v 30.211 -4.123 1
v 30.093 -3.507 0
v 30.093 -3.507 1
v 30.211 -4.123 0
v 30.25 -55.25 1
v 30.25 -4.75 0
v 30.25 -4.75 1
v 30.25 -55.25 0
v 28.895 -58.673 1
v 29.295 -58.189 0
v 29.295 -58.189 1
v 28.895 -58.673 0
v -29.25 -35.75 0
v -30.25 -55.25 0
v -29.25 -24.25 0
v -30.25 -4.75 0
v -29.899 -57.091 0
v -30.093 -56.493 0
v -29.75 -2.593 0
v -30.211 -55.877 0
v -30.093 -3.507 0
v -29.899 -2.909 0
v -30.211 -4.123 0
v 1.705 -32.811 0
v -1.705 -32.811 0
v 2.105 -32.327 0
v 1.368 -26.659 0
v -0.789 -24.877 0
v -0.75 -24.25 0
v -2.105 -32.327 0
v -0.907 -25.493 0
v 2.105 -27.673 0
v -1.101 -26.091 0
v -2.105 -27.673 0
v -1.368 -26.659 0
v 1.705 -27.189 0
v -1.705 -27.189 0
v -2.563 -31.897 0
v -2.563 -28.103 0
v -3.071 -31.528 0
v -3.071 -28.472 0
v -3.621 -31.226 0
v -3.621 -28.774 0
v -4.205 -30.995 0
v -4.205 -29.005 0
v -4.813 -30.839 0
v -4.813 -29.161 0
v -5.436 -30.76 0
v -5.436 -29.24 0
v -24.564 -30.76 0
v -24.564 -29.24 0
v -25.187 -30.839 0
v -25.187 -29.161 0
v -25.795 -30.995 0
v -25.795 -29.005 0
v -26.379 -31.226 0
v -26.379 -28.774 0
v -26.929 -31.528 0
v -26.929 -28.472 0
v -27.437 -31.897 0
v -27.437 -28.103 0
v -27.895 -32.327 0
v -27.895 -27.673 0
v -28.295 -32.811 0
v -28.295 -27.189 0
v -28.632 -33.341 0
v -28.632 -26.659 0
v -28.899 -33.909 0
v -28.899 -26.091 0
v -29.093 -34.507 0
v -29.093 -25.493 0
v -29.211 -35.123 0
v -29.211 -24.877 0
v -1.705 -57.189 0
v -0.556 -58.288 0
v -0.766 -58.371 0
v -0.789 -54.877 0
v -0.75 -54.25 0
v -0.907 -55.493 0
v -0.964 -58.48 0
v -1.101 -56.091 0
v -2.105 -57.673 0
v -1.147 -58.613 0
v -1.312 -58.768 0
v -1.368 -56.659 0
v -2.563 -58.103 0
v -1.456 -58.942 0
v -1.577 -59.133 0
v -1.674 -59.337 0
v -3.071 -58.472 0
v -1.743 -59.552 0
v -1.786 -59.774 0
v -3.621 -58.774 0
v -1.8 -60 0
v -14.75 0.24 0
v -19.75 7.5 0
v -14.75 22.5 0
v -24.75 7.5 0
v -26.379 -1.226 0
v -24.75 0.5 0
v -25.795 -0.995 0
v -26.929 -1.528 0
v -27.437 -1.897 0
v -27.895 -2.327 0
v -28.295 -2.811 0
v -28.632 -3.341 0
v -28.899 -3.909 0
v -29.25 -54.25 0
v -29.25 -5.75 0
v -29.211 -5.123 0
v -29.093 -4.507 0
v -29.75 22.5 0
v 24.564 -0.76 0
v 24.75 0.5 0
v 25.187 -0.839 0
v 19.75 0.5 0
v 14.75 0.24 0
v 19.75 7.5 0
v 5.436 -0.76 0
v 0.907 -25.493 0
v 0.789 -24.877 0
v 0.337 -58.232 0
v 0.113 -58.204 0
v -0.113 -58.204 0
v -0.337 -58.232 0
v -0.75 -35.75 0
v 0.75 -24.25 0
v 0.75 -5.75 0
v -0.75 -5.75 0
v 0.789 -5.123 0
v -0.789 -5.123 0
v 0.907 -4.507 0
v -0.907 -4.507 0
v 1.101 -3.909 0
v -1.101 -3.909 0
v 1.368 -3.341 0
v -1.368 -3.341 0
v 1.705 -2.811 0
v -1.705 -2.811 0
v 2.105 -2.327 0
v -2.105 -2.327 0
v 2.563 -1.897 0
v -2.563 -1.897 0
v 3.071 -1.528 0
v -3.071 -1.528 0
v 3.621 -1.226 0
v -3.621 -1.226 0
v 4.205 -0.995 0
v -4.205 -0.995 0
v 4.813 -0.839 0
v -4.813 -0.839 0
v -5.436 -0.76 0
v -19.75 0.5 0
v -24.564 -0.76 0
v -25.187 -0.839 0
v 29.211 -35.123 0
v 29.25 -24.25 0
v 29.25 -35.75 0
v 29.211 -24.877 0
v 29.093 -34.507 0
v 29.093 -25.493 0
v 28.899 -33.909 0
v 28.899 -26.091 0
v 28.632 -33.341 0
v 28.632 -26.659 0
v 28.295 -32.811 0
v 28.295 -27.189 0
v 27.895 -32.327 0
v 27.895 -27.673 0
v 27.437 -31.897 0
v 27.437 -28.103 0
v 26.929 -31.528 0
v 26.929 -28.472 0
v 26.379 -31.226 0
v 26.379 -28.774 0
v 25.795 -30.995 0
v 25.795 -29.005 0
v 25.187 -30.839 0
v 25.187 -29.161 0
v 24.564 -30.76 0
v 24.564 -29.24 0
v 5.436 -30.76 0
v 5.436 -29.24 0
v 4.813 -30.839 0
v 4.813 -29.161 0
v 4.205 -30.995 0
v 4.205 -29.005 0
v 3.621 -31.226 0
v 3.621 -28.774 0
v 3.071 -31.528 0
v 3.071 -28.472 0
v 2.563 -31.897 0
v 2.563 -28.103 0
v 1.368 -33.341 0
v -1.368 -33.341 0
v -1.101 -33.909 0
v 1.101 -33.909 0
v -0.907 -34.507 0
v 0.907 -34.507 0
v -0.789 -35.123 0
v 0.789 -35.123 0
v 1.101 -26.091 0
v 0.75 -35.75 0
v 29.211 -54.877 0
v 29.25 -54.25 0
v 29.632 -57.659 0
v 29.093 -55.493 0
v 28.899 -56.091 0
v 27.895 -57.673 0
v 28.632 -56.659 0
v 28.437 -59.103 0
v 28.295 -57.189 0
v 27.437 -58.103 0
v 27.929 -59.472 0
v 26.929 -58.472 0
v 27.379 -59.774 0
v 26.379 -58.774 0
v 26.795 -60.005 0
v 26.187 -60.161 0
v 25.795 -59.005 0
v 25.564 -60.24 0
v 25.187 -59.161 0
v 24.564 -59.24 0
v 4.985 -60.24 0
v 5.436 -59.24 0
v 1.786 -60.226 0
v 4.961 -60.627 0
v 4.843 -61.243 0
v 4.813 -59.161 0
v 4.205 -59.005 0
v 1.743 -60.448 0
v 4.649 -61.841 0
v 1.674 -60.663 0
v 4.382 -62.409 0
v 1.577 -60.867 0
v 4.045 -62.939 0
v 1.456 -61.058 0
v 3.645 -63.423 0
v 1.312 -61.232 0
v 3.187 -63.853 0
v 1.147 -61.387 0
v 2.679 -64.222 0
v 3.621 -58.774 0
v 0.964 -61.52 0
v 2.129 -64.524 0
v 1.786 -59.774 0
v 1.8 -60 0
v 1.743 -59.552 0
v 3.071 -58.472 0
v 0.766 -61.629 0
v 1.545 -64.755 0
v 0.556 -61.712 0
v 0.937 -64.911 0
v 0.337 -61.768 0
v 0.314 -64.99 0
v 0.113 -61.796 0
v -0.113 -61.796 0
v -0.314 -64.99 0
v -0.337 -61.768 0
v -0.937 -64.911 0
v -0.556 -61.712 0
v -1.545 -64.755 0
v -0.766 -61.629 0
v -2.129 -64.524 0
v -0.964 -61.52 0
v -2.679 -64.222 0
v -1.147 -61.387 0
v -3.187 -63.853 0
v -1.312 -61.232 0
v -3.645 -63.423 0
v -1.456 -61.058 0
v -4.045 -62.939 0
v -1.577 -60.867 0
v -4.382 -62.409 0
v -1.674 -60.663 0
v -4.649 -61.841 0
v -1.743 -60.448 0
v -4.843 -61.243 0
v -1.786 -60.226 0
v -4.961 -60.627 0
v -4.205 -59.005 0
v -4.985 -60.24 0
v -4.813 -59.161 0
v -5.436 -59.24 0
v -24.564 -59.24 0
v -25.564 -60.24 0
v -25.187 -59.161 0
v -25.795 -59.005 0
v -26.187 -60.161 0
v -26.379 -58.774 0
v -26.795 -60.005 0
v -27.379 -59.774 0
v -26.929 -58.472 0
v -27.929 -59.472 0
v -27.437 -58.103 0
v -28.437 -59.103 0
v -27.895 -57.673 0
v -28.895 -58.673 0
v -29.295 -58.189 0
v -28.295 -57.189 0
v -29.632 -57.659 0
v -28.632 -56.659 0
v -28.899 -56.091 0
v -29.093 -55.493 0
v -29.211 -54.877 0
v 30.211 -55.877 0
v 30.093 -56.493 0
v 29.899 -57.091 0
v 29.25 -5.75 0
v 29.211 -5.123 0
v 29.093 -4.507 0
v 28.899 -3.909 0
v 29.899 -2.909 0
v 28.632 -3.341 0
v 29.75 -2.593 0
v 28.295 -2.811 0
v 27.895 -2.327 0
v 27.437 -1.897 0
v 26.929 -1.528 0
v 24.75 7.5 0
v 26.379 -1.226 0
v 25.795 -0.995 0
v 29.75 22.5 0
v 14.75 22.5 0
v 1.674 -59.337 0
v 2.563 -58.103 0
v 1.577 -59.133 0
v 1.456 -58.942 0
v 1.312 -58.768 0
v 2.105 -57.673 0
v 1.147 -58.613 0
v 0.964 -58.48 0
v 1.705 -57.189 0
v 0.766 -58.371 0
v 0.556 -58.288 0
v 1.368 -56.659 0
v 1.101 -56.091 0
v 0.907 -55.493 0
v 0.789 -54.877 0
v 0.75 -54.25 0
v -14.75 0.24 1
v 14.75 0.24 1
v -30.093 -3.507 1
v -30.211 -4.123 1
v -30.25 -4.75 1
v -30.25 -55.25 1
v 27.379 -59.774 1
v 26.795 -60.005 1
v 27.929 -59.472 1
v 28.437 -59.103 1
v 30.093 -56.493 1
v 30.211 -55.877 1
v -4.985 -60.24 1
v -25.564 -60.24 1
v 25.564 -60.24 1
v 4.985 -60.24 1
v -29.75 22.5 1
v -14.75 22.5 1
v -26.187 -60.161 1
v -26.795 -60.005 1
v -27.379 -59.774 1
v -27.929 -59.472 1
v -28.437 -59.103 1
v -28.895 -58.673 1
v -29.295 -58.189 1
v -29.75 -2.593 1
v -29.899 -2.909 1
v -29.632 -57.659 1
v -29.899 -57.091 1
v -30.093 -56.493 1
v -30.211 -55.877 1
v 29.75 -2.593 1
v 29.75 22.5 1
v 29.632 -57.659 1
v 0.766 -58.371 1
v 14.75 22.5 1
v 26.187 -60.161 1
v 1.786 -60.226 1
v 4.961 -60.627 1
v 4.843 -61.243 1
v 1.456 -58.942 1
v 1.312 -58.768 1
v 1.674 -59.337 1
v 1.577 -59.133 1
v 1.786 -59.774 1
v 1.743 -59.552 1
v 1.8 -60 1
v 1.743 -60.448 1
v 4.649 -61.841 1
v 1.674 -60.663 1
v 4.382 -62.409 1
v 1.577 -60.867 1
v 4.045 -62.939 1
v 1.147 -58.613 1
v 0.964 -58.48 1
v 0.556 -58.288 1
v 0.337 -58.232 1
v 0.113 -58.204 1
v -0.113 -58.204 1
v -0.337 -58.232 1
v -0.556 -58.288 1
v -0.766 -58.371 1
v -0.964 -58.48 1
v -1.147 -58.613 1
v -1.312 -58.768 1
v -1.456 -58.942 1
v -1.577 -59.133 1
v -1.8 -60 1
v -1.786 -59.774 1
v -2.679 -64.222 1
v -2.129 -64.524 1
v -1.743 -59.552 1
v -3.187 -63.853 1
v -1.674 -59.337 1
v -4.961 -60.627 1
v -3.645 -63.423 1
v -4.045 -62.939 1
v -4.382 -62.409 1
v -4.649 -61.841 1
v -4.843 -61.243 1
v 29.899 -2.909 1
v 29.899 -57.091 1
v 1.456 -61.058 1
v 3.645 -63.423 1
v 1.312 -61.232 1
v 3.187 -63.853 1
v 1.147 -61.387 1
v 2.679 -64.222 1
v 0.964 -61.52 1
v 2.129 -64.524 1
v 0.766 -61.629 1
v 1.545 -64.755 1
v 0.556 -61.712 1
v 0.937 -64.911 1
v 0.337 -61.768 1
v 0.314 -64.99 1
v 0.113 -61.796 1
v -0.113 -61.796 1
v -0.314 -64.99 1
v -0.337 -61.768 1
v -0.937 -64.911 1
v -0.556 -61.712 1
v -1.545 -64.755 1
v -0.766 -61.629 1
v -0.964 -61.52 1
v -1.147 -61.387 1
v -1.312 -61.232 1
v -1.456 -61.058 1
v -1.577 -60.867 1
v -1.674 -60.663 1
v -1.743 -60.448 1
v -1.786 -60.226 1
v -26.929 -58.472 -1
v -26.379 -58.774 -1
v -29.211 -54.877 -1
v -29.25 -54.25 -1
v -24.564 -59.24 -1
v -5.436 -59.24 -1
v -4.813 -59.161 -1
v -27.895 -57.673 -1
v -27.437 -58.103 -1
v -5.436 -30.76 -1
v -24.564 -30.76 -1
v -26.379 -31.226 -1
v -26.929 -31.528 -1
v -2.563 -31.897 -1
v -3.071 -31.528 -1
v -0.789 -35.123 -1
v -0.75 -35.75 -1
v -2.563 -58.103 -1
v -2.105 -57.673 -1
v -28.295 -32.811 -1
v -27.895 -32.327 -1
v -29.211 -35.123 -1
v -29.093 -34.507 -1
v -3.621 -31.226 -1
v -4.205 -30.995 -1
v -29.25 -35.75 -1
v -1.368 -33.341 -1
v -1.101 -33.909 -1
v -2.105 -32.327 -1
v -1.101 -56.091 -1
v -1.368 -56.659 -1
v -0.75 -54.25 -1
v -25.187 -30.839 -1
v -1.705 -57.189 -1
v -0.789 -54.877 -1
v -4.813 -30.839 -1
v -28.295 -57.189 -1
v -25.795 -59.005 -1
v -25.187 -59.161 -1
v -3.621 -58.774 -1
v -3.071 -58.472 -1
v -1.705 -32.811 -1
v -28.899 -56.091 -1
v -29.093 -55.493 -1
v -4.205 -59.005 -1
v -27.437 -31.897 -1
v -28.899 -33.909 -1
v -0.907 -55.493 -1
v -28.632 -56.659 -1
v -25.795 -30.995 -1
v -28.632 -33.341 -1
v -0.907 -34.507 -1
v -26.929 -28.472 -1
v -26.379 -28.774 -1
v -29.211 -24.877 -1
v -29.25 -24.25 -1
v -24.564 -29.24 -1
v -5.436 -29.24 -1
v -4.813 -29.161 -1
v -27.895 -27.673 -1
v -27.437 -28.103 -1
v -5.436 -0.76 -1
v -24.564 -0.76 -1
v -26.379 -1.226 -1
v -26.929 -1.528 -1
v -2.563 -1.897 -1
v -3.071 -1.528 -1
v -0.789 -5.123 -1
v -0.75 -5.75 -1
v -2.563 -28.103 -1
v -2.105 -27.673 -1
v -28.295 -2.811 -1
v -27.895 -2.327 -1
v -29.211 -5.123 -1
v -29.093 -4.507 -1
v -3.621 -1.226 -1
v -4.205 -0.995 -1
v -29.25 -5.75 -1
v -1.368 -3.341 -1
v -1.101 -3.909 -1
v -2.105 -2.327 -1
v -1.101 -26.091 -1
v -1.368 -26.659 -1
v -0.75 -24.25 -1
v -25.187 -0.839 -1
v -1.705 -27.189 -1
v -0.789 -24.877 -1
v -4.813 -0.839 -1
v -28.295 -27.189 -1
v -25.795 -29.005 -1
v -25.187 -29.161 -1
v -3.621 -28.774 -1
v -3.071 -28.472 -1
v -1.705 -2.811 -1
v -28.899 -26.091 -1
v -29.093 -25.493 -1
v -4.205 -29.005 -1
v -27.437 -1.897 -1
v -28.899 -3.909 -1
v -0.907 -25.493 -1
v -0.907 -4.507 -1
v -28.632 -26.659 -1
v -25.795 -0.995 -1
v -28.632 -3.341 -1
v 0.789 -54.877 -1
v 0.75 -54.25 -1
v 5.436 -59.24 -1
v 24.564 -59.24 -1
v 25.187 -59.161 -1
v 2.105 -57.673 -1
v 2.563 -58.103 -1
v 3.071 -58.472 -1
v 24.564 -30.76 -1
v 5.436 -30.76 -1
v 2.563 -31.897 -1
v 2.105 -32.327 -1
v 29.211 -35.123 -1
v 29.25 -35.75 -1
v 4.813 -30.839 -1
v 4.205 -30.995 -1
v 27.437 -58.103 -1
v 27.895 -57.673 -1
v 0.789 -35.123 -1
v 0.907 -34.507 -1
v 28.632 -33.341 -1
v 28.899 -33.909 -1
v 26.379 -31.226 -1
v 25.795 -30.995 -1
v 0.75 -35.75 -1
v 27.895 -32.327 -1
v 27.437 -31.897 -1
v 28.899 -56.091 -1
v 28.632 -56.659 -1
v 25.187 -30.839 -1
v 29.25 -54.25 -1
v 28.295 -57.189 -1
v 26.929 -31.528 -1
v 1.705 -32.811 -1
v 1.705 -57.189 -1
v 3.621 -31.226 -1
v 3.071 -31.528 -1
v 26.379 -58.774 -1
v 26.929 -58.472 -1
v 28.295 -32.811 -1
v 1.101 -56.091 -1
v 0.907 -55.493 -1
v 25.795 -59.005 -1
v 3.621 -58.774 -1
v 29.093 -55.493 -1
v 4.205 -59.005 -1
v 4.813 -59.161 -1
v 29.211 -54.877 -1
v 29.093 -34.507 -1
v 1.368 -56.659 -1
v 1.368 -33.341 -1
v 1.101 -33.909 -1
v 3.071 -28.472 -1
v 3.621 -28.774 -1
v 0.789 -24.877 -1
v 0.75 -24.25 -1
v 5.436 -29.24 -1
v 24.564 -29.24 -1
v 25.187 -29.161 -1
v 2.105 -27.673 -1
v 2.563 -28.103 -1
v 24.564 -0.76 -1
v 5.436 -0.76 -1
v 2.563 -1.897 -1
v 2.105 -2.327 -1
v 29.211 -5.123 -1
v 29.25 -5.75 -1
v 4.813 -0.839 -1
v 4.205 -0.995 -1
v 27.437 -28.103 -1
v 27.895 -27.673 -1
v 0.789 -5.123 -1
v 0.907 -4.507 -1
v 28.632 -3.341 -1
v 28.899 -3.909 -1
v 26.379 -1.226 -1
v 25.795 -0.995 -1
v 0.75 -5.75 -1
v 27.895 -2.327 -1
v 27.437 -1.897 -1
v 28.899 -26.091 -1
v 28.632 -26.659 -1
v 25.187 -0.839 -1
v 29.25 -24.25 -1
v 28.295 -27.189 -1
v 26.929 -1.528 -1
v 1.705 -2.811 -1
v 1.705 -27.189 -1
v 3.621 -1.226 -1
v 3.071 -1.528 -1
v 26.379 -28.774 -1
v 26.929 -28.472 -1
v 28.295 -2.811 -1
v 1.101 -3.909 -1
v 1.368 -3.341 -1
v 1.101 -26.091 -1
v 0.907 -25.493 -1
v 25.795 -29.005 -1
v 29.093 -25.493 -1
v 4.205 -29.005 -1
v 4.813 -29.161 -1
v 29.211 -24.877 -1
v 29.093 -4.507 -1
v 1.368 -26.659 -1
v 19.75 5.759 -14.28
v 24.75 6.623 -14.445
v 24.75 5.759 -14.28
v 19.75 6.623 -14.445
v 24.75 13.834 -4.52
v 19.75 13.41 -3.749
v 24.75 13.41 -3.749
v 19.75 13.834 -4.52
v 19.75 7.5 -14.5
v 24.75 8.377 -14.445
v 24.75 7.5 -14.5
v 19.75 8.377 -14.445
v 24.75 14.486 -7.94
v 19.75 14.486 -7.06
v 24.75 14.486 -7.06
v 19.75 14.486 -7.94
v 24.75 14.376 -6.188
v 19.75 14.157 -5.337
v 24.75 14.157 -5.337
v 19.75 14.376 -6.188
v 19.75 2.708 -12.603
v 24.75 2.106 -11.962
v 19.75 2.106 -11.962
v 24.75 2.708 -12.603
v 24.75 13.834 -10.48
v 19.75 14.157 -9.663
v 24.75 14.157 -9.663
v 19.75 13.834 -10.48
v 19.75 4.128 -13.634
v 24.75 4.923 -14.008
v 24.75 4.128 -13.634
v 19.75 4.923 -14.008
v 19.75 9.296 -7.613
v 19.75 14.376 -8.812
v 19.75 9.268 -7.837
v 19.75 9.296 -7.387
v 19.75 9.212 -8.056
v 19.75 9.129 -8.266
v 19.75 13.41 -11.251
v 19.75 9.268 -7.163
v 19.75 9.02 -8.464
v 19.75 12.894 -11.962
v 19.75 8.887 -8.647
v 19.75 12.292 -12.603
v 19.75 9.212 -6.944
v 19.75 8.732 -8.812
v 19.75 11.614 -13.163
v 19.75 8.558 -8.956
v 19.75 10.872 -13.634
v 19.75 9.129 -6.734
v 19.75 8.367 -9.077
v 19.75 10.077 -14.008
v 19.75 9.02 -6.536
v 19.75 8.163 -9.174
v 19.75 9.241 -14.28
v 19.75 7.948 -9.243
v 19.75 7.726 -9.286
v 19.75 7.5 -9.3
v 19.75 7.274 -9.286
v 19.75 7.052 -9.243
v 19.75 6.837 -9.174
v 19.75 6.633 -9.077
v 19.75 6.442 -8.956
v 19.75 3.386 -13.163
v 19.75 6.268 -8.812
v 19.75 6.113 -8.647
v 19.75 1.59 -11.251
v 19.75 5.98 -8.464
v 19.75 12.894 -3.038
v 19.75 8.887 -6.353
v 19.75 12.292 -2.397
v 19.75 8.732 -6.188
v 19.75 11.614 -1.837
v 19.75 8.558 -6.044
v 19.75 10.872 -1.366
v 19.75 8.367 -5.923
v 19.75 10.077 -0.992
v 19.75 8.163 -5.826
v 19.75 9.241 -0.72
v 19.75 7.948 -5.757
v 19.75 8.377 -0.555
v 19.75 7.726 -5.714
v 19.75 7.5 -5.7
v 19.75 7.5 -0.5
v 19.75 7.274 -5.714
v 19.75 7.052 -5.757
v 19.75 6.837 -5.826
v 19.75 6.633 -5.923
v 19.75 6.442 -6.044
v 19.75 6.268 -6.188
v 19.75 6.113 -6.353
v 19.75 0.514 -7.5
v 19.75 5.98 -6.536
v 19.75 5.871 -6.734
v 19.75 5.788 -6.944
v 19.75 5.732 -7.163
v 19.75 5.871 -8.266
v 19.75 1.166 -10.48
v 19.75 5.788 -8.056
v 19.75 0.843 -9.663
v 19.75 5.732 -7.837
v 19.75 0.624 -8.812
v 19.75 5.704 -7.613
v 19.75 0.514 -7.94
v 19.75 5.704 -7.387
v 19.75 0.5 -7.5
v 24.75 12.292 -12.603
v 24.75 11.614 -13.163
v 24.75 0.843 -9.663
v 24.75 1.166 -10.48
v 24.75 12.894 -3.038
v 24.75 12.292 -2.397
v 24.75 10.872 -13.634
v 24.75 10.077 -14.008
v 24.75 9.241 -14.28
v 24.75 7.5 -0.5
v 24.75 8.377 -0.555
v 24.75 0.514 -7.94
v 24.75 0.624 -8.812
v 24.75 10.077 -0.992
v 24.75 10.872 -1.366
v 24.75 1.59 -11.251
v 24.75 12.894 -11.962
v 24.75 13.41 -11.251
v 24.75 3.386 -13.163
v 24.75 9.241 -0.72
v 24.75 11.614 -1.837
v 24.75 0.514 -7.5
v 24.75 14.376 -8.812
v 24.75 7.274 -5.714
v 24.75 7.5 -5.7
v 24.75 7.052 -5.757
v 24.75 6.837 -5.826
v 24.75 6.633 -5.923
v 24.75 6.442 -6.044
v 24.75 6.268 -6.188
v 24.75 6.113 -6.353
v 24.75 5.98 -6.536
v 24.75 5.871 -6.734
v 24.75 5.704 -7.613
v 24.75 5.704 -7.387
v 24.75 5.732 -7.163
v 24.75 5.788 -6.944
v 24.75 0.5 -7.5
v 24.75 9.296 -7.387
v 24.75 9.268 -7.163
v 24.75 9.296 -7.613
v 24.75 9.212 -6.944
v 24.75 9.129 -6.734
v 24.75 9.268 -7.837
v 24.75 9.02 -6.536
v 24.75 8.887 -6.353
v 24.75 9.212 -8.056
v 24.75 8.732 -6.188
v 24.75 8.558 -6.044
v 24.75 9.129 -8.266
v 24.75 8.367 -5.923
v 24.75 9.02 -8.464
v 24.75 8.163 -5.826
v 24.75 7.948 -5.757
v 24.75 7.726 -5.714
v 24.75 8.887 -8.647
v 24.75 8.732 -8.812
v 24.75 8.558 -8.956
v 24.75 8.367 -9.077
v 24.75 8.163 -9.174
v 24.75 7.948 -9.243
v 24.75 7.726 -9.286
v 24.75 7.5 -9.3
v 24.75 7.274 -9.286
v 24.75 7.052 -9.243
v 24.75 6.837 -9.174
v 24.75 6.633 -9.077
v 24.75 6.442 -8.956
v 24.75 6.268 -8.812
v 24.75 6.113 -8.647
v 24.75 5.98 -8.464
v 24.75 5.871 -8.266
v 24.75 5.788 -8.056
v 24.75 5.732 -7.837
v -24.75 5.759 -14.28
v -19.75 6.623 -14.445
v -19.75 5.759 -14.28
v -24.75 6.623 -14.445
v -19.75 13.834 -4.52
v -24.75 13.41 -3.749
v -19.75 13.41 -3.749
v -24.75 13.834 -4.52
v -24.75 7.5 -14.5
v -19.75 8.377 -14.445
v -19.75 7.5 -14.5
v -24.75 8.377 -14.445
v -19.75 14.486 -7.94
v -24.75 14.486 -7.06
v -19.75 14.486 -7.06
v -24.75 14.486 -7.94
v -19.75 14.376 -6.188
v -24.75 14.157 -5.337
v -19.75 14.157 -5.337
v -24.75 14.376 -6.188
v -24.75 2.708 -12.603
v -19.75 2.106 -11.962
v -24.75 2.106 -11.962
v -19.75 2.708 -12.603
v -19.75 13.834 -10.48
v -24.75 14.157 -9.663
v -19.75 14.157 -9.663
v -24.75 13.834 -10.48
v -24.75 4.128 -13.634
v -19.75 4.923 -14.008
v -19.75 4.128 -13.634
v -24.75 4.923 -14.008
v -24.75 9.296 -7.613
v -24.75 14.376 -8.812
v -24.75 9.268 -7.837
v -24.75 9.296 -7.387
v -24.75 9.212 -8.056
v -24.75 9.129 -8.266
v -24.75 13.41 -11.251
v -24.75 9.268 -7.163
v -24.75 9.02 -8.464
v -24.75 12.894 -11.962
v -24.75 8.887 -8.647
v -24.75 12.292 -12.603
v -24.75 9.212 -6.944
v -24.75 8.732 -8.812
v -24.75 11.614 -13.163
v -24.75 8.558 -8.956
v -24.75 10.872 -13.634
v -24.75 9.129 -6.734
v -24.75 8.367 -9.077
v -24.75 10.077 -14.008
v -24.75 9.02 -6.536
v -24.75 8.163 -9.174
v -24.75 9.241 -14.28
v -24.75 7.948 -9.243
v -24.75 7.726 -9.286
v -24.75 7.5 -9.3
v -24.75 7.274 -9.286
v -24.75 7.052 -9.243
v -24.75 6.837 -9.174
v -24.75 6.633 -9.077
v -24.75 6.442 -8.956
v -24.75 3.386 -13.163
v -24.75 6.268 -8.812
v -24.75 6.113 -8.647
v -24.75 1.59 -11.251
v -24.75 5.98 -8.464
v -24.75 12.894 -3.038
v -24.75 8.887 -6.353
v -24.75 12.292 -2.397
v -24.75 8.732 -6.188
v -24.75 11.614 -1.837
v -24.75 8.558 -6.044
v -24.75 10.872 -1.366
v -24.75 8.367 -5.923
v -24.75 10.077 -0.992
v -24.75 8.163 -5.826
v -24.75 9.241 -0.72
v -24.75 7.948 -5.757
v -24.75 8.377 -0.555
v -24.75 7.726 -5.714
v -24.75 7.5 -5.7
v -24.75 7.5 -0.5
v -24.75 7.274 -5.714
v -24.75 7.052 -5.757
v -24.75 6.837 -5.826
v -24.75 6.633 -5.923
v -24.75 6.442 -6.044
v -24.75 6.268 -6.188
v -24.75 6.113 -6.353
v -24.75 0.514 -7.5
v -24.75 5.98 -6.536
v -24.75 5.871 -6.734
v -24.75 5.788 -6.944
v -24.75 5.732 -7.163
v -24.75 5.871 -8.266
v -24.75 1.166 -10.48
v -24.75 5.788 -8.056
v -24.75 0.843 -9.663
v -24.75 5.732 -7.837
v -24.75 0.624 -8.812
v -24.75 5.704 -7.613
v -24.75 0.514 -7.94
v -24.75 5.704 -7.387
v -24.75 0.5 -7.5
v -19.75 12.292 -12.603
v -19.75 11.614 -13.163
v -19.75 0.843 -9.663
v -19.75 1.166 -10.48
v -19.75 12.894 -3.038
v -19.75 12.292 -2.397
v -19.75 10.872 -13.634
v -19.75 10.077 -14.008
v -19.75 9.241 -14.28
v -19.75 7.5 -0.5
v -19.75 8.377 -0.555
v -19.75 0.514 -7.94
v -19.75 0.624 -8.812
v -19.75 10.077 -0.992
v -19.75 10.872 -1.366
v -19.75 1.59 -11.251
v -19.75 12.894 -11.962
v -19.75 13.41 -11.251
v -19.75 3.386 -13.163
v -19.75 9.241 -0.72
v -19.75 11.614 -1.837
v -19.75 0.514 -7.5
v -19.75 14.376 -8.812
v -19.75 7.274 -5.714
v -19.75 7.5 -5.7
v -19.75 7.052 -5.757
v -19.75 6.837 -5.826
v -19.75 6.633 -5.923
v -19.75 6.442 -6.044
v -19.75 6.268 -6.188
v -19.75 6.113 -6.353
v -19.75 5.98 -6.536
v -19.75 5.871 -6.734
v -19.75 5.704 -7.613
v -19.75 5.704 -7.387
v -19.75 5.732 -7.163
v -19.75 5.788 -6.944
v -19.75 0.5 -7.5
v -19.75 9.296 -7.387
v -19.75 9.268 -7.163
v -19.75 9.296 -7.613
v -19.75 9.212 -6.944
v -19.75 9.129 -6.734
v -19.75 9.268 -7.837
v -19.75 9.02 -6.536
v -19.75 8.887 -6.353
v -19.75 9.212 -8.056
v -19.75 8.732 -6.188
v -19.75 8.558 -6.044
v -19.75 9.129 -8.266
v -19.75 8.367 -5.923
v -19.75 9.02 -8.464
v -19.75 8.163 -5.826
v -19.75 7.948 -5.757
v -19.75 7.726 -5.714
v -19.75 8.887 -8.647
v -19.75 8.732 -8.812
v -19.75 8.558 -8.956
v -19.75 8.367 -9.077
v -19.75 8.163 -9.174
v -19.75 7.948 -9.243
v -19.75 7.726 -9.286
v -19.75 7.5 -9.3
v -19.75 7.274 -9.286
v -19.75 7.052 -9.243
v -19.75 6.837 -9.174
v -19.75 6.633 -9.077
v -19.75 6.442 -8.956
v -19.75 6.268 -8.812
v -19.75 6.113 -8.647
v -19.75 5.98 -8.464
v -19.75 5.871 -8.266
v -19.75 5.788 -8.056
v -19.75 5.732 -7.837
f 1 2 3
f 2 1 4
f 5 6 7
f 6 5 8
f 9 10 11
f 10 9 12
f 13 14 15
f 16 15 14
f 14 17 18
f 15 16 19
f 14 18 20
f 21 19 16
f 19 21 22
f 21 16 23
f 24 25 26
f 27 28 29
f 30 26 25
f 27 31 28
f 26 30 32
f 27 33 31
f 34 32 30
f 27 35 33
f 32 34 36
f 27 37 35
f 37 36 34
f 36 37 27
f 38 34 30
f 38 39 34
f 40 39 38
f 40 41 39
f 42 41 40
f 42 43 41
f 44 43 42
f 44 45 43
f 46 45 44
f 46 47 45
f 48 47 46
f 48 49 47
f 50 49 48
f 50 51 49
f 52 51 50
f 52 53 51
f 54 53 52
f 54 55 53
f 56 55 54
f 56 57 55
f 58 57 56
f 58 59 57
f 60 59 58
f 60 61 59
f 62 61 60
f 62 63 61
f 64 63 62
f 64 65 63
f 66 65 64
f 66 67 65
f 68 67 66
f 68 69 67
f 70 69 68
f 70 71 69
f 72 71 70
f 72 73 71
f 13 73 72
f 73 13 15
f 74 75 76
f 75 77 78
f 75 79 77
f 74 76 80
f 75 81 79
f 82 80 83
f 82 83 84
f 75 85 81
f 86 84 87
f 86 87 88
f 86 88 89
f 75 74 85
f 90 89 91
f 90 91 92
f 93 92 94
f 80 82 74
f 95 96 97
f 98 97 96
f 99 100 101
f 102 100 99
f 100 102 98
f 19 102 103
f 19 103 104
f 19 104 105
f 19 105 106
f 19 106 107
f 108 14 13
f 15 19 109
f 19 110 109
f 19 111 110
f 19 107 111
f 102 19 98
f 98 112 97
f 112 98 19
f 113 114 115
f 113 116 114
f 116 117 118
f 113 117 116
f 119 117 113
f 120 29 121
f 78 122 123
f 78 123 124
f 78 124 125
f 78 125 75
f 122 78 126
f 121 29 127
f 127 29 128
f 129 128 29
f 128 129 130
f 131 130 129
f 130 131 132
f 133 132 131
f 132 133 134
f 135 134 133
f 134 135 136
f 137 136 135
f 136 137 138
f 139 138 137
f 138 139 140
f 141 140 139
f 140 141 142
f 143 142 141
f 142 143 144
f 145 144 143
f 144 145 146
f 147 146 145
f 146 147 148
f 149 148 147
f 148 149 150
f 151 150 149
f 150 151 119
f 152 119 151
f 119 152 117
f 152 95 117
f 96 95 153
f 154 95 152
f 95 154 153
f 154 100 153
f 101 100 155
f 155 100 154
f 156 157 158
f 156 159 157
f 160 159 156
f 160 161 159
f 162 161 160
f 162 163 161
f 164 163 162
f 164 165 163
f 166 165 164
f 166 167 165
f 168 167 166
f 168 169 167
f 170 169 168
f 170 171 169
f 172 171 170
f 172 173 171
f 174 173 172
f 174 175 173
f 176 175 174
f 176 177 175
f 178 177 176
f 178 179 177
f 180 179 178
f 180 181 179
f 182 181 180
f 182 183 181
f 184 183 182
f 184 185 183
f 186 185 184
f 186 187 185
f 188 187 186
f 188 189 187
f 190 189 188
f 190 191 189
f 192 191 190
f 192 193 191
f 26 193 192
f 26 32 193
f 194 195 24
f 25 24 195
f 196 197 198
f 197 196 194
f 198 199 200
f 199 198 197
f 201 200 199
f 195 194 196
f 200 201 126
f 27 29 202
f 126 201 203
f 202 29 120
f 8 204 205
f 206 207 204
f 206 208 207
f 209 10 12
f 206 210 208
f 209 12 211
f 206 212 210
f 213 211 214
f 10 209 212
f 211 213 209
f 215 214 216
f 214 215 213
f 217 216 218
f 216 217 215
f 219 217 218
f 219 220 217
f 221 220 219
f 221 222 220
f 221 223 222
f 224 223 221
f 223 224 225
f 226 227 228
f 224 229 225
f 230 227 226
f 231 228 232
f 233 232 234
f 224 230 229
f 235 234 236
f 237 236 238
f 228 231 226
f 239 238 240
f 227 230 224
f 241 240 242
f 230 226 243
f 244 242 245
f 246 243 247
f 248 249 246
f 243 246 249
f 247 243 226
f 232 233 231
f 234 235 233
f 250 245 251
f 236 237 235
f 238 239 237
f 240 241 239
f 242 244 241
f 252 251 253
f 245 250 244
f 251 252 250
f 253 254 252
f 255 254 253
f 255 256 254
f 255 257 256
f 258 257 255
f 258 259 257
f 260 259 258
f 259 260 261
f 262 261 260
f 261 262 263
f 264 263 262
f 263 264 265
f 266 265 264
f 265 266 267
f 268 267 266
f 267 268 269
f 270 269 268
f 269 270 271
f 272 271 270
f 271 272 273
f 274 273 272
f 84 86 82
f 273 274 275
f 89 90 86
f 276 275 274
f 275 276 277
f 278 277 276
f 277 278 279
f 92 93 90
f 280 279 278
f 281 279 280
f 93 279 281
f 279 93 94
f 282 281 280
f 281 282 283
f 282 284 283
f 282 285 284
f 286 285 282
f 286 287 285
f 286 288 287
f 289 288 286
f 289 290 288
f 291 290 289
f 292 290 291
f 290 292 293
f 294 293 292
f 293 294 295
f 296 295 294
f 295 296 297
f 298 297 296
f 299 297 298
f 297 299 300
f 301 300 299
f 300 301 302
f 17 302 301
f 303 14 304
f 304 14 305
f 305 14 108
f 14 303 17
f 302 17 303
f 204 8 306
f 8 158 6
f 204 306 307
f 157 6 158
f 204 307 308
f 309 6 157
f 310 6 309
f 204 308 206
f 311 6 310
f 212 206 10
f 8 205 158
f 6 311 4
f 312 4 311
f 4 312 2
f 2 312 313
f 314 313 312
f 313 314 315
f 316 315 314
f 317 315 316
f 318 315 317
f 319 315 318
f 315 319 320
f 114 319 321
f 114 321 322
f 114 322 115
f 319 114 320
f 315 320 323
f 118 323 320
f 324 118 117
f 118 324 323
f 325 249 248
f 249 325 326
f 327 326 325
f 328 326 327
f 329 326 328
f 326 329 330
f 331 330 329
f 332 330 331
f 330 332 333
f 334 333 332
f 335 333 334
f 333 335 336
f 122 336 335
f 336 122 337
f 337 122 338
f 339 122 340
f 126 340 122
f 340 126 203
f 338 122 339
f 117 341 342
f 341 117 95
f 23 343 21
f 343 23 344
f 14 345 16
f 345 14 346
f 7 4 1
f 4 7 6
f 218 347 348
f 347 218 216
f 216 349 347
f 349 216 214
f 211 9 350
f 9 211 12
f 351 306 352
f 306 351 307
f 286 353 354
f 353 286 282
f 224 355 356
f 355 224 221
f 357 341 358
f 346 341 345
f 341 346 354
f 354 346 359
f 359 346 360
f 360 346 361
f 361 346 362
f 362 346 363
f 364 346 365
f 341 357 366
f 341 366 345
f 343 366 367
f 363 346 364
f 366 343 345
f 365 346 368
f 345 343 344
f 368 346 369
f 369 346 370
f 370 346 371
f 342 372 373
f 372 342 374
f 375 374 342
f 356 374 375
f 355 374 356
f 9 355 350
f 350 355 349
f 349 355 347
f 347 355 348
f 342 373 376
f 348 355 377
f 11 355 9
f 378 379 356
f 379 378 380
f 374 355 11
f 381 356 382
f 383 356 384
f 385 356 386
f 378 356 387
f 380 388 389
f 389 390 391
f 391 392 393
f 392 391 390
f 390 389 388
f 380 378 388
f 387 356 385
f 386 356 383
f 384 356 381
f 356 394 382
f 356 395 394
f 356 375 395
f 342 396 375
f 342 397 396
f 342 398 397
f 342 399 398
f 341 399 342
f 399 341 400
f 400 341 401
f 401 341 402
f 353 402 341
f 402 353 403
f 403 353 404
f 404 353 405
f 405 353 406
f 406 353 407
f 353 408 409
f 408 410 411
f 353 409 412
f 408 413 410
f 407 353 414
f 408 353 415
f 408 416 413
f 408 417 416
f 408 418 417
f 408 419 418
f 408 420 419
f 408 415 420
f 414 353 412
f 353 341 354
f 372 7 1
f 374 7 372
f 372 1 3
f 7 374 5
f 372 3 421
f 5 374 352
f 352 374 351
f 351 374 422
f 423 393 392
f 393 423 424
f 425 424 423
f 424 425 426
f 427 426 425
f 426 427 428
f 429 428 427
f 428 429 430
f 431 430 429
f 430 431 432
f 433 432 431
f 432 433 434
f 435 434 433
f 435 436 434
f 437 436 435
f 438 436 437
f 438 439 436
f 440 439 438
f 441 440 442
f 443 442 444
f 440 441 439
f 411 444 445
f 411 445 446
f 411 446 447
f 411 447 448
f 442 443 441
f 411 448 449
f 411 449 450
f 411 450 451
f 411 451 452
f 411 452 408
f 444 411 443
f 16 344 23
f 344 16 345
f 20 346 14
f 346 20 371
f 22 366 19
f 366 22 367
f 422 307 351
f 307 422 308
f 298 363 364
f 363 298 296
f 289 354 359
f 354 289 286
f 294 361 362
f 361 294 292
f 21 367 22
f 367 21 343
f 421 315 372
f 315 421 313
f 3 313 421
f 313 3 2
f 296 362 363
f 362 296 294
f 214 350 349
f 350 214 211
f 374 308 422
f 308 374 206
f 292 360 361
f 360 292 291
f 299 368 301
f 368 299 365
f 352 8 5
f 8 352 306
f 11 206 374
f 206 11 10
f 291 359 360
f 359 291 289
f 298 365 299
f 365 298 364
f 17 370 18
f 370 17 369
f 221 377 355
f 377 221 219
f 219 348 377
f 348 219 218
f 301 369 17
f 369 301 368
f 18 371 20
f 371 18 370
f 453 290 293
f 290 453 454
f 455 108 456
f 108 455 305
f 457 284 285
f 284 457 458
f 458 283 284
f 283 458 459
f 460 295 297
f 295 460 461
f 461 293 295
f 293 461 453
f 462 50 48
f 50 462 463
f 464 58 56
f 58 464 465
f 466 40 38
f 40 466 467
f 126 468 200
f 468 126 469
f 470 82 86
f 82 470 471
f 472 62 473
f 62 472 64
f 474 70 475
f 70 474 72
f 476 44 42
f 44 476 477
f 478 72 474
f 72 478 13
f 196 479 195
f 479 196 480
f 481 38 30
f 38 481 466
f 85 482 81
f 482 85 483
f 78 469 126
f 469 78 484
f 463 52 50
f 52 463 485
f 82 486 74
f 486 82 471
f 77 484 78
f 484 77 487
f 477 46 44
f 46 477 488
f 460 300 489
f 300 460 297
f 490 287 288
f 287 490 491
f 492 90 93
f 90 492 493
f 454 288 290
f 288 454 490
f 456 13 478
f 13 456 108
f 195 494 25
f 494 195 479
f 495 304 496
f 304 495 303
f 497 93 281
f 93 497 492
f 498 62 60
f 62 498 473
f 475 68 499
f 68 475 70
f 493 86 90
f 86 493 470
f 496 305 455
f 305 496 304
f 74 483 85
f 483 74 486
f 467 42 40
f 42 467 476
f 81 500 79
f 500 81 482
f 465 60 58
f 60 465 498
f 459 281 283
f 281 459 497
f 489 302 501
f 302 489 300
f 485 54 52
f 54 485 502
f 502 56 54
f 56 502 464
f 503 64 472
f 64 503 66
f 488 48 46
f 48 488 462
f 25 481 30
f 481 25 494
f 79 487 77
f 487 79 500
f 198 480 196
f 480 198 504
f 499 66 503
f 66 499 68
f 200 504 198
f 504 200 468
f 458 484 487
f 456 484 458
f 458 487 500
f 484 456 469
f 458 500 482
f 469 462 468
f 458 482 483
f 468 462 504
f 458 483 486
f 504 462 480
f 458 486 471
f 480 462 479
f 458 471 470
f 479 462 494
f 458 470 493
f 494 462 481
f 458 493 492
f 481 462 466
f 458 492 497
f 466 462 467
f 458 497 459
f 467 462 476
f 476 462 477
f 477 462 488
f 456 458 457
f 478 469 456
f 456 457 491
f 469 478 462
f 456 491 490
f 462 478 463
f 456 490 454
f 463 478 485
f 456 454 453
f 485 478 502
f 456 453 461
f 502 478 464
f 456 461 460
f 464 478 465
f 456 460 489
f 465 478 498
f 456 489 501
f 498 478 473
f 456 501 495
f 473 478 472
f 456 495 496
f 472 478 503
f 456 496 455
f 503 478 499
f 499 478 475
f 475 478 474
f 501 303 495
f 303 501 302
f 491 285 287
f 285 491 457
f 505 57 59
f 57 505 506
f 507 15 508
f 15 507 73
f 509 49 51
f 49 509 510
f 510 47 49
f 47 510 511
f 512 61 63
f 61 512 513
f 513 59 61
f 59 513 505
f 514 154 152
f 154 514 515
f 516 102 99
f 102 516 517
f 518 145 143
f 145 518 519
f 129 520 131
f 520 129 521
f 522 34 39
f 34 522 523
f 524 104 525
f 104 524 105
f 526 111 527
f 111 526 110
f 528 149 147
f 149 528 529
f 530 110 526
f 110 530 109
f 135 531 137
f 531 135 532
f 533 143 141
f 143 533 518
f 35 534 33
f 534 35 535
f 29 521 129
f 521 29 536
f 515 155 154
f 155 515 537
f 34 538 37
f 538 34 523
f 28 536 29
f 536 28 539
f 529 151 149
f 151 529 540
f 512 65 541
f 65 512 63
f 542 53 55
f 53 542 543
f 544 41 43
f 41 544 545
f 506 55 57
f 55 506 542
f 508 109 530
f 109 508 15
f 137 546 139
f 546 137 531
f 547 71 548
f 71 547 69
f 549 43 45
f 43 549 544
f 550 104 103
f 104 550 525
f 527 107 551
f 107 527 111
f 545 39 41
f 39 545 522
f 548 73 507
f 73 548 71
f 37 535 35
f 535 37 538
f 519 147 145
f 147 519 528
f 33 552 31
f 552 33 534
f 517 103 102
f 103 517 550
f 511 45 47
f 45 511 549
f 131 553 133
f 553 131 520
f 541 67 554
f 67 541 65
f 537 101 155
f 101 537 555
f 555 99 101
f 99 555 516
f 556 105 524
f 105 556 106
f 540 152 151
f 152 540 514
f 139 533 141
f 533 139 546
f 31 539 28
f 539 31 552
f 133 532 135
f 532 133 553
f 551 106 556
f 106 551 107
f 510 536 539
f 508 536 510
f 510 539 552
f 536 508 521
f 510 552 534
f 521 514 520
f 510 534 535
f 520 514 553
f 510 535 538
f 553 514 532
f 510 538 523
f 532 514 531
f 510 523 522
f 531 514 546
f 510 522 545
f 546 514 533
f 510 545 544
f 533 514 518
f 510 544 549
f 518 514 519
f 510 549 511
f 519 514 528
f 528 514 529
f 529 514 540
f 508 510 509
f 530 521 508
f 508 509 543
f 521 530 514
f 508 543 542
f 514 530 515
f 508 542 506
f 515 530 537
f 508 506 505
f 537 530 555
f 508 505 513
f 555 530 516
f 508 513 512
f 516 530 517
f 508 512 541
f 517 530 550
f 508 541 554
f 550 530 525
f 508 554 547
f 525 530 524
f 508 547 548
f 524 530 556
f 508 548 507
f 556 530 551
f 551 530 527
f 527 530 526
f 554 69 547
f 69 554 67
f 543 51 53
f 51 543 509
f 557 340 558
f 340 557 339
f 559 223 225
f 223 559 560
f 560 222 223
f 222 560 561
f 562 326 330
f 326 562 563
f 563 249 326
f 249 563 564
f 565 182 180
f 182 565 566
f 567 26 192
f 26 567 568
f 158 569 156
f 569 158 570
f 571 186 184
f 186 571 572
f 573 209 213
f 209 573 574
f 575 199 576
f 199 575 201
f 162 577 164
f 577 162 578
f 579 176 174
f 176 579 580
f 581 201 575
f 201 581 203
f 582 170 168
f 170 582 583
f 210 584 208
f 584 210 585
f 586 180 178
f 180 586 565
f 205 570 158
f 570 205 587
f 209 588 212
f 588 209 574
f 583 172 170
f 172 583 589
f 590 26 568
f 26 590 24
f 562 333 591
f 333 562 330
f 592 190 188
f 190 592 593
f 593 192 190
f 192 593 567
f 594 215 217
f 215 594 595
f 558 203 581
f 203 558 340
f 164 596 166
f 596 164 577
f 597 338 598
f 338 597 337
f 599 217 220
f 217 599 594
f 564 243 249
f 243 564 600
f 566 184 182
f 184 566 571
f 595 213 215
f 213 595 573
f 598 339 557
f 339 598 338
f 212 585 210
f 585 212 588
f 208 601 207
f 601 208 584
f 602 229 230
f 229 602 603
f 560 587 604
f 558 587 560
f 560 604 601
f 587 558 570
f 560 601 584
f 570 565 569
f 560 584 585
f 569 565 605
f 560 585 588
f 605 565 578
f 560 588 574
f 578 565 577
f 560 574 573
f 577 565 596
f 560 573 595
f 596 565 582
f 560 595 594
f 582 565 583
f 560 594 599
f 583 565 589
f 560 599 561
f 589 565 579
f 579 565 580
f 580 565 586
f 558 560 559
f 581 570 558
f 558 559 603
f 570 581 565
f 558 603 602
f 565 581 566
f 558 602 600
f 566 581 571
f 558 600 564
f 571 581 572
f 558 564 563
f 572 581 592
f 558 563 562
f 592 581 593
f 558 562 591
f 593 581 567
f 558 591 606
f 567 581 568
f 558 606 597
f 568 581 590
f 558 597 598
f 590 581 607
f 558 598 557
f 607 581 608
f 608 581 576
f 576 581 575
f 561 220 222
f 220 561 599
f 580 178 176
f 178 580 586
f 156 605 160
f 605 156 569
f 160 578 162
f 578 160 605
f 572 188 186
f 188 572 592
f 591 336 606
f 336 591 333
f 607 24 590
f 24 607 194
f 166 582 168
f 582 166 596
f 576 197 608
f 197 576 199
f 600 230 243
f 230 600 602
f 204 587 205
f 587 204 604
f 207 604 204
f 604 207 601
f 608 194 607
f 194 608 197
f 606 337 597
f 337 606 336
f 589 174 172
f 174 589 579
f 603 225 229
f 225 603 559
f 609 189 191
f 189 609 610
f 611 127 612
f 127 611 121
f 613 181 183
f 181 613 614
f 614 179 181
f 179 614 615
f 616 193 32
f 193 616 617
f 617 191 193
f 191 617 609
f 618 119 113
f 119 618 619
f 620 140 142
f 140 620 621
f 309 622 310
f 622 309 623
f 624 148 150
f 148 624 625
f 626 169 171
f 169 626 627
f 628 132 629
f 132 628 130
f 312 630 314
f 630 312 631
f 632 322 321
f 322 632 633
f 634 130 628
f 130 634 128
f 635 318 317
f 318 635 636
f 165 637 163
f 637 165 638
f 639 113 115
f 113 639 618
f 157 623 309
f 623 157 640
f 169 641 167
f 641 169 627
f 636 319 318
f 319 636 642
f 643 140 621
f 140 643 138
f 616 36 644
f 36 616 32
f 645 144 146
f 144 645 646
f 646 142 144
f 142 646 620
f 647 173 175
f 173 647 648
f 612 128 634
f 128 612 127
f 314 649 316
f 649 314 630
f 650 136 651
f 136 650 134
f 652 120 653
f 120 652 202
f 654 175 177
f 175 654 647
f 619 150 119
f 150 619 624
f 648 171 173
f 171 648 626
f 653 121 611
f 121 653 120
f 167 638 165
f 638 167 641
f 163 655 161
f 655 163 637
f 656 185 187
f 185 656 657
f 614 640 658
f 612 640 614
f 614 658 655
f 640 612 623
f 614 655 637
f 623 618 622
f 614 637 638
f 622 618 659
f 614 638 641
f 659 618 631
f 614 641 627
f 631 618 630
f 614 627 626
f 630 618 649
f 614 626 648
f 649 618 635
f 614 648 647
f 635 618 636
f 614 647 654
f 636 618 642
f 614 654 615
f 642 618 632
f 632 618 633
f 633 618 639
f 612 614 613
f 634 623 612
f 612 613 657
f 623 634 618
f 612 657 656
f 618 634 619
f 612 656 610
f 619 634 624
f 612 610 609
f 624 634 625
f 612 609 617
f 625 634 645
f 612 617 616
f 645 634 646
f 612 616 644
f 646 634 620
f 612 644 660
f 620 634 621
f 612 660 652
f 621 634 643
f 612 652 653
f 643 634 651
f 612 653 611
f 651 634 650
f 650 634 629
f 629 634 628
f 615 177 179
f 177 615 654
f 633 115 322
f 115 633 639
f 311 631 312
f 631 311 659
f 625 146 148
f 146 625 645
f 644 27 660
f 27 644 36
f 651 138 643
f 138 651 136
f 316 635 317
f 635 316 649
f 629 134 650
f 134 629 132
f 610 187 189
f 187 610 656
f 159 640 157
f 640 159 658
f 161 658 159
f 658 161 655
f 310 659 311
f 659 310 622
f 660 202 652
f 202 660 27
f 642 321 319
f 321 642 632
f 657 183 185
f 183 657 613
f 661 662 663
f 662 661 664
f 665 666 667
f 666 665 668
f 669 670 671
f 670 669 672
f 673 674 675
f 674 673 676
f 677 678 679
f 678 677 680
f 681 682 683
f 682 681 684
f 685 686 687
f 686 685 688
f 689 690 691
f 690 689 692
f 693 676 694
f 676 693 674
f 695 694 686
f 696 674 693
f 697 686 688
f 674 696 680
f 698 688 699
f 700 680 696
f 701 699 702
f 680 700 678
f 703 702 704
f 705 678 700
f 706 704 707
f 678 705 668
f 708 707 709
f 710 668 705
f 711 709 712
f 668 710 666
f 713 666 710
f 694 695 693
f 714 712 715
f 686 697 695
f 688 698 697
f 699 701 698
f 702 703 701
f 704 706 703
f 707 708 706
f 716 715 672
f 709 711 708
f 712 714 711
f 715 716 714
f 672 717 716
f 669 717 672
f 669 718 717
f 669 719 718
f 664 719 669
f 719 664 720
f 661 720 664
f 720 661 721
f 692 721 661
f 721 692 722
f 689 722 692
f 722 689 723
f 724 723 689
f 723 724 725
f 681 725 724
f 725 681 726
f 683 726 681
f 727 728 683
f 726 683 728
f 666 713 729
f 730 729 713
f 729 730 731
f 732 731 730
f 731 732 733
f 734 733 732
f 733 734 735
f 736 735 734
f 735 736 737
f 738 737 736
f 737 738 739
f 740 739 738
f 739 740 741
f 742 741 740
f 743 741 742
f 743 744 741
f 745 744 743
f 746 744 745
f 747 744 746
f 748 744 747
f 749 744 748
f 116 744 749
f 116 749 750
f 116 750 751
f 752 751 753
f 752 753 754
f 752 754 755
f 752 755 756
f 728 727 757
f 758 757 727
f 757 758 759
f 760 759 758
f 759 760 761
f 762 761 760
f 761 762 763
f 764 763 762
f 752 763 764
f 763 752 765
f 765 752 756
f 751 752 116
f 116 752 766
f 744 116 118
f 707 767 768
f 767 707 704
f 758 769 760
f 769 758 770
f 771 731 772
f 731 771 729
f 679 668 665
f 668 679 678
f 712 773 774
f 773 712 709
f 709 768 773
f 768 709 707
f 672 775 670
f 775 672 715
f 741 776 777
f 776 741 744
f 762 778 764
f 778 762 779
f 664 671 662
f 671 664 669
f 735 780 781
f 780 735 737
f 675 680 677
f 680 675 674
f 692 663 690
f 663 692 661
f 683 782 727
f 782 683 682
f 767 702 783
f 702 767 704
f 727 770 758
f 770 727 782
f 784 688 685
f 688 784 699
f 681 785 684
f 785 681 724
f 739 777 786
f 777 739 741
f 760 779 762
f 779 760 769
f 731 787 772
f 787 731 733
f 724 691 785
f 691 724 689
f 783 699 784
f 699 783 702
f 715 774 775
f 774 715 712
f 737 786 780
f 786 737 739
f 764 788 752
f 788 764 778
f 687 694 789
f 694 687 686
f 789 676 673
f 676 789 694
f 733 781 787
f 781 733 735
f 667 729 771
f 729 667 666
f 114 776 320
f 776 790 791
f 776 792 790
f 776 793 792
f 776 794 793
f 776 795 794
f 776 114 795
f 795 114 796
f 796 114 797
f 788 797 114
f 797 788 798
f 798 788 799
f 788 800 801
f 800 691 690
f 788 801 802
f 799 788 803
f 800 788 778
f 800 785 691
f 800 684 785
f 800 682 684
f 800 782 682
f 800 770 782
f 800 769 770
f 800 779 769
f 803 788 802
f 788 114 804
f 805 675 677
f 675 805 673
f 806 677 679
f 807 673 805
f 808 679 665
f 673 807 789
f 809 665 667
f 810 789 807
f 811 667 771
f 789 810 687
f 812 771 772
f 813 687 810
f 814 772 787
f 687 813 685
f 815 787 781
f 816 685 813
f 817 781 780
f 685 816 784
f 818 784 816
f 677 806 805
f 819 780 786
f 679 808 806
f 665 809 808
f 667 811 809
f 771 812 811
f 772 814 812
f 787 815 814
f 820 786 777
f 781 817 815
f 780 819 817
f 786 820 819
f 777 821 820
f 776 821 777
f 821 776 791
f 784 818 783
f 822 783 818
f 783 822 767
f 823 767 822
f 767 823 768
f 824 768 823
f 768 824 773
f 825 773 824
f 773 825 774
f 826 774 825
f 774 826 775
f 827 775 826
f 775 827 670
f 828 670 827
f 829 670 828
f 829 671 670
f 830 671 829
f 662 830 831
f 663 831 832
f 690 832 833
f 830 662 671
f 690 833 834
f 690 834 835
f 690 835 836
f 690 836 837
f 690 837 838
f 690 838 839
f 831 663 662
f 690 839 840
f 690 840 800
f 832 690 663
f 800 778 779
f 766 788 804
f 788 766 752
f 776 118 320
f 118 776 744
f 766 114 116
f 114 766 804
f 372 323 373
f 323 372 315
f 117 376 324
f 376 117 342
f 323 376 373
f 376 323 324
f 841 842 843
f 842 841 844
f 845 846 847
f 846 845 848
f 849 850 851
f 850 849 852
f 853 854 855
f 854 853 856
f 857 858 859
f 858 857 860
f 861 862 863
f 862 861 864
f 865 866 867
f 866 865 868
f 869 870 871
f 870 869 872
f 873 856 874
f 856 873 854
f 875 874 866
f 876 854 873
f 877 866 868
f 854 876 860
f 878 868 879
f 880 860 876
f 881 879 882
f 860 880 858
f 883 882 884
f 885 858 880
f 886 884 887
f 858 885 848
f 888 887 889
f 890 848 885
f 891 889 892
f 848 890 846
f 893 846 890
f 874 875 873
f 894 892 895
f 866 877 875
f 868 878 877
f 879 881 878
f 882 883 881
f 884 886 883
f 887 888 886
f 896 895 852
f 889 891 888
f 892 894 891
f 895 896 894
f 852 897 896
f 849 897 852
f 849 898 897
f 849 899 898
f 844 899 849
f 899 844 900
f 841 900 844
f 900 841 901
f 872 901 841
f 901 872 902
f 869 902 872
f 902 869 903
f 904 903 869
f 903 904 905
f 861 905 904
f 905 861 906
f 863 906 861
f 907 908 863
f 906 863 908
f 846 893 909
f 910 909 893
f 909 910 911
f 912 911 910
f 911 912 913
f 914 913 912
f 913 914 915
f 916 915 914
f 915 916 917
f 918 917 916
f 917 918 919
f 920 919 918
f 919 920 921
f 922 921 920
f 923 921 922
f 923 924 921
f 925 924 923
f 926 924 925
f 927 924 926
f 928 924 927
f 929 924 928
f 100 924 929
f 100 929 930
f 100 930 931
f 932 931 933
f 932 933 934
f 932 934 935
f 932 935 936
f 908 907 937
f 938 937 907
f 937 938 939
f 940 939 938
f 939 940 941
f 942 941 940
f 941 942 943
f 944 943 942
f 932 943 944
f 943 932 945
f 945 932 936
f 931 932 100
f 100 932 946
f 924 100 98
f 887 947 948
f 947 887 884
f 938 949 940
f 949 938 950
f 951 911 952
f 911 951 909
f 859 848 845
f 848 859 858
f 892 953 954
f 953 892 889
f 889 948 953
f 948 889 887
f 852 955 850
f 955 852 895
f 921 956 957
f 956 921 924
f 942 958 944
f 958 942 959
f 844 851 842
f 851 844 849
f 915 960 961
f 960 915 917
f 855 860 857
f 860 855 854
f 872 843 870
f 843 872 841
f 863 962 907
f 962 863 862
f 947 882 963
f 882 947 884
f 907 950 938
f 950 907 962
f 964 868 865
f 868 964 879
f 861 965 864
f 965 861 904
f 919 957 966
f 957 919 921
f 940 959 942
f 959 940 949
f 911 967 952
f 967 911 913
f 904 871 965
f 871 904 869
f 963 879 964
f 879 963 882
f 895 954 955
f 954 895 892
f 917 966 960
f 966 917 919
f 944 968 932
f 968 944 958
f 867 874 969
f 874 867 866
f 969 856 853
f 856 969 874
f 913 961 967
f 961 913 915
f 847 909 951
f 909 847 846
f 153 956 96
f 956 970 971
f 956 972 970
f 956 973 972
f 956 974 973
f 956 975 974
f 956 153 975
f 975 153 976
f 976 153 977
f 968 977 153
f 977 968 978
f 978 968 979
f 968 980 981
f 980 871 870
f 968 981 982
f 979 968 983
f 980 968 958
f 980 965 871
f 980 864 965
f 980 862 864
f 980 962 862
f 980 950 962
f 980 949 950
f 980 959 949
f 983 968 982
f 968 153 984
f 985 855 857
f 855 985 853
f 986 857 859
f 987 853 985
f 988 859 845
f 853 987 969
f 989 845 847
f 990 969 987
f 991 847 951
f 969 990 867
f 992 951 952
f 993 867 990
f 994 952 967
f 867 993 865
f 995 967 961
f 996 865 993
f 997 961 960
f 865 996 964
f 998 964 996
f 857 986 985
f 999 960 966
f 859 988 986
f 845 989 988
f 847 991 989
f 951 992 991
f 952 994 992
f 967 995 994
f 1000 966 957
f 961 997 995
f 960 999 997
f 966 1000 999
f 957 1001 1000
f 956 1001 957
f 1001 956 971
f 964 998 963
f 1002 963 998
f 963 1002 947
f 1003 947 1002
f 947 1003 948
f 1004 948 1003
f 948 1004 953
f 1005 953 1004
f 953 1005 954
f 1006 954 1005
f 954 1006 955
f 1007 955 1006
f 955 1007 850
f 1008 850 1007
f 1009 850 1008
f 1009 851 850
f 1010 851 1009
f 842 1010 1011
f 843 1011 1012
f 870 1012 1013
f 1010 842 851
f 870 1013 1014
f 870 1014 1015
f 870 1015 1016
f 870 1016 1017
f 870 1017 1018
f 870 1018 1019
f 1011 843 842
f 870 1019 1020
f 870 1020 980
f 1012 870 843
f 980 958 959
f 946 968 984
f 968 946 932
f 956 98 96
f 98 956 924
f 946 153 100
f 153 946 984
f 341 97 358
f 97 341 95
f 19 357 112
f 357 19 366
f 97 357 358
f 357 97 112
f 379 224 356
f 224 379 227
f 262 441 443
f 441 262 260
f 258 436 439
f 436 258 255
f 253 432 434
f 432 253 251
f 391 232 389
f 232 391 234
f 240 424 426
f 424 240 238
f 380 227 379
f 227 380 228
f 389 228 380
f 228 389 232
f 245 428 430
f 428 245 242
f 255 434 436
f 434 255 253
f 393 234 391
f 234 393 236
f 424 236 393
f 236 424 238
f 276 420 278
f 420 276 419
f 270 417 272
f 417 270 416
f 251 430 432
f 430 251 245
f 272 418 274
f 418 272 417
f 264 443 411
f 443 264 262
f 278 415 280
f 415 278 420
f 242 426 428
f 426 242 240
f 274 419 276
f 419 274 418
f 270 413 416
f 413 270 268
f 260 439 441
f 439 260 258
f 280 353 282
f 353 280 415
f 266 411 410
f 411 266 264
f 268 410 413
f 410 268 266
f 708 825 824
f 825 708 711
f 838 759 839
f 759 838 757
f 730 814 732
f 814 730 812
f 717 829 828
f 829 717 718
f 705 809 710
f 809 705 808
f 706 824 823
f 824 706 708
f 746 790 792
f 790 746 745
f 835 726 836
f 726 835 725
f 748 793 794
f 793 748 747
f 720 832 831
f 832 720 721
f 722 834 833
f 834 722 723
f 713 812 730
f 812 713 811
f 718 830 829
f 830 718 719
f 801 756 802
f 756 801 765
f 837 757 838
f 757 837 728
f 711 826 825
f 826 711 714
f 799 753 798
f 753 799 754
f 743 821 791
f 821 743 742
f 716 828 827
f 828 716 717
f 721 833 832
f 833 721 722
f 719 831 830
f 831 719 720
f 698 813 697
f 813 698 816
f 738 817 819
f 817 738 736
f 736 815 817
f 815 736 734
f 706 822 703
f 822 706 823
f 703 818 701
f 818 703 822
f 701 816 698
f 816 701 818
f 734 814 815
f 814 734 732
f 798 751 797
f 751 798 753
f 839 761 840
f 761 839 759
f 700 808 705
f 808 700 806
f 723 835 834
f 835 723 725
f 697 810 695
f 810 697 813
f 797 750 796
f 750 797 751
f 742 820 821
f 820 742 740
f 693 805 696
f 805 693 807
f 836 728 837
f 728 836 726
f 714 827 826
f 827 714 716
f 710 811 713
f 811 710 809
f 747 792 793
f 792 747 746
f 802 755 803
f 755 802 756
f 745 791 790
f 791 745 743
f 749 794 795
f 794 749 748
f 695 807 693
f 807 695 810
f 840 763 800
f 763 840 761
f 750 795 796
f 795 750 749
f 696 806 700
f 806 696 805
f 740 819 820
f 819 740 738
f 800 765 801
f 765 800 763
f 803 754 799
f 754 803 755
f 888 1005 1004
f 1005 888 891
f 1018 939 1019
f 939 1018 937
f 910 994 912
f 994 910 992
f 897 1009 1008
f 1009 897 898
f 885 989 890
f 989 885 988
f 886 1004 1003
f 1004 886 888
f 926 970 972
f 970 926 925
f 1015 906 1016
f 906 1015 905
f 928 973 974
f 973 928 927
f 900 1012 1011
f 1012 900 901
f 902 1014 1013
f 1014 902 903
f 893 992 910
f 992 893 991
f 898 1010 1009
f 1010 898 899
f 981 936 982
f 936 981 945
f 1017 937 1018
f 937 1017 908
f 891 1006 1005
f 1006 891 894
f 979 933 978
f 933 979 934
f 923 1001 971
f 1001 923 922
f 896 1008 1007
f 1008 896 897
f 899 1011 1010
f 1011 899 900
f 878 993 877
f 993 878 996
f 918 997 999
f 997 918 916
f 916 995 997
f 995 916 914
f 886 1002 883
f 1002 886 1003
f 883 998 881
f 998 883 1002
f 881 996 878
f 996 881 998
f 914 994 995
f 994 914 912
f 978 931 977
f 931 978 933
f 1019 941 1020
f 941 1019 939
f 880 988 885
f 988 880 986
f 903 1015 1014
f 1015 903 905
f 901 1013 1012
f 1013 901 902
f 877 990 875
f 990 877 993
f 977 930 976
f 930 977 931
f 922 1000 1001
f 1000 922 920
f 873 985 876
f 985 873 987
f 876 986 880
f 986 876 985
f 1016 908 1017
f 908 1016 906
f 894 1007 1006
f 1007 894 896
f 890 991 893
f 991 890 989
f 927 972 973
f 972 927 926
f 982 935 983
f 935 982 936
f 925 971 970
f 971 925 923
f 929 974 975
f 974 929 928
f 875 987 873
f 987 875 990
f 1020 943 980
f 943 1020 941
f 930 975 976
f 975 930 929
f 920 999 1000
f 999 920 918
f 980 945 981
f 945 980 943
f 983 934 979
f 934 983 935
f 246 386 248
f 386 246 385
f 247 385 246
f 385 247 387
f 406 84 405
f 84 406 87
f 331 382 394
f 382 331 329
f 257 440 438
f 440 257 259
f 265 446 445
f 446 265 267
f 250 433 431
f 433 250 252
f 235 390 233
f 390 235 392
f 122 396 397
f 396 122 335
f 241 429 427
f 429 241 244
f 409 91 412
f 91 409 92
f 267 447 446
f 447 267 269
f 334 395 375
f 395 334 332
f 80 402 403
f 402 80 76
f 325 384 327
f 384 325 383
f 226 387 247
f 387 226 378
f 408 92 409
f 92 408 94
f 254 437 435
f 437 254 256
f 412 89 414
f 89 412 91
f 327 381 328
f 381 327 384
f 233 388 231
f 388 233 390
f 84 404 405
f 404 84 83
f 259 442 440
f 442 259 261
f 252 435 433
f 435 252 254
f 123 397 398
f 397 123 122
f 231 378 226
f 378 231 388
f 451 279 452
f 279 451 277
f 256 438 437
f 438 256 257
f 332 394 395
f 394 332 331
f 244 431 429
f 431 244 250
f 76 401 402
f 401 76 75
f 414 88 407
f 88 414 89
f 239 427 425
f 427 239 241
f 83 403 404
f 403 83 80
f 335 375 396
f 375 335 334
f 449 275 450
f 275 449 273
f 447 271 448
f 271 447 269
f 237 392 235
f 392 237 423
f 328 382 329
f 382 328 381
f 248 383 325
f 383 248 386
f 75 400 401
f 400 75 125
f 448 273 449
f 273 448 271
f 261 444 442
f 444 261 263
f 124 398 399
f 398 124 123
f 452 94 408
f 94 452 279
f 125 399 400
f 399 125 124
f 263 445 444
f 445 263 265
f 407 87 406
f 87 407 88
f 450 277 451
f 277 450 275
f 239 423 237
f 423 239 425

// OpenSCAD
$fn = 50;


difference() {
	union() {
		translate(v = [0, -30.0000000000, 0]) {
			hull() {
				translate(v = [-25.2500000000, 25.2500000000, 0]) {
					cylinder(h = 1, r = 5);
				}
				translate(v = [25.2500000000, 25.2500000000, 0]) {
					cylinder(h = 1, r = 5);
				}
				translate(v = [-25.2500000000, -25.2500000000, 0]) {
					cylinder(h = 1, r = 5);
				}
				translate(v = [25.2500000000, -25.2500000000, 0]) {
					cylinder(h = 1, r = 5);
				}
			}
		}
		translate(v = [-15.0000000000, -45.0000000000, -1]) {
			hull() {
				translate(v = [-9.2500000000, 9.2500000000, 0]) {
					cylinder(h = 2, r = 5);
				}
				translate(v = [9.2500000000, 9.2500000000, 0]) {
					cylinder(h = 2, r = 5);
				}
				translate(v = [-9.2500000000, -9.2500000000, 0]) {
					cylinder(h = 2, r = 5);
				}
				translate(v = [9.2500000000, -9.2500000000, 0]) {
					cylinder(h = 2, r = 5);
				}
			}
		}
		translate(v = [-15.0000000000, -15.0000000000, -1]) {
			hull() {
				translate(v = [-9.2500000000, 9.2500000000, 0]) {
					cylinder(h = 2, r = 5);
				}
				translate(v = [9.2500000000, 9.2500000000, 0]) {
					cylinder(h = 2, r = 5);
				}
				translate(v = [-9.2500000000, -9.2500000000, 0]) {
					cylinder(h = 2, r = 5);
				}
				translate(v = [9.2500000000, -9.2500000000, 0]) {
					cylinder(h = 2, r = 5);
				}
			}
		}
		translate(v = [15.0000000000, -45.0000000000, -1]) {
			hull() {
				translate(v = [-9.2500000000, 9.2500000000, 0]) {
					cylinder(h = 2, r = 5);
				}
				translate(v = [9.2500000000, 9.2500000000, 0]) {
					cylinder(h = 2, r = 5);
				}
				translate(v = [-9.2500000000, -9.2500000000, 0]) {
					cylinder(h = 2, r = 5);
				}
				translate(v = [9.2500000000, -9.2500000000, 0]) {
					cylinder(h = 2, r = 5);
				}
			}
		}
		translate(v = [15.0000000000, -15.0000000000, -1]) {
			hull() {
				translate(v = [-9.2500000000, 9.2500000000, 0]) {
					cylinder(h = 2, r = 5);
				}
				translate(v = [9.2500000000, 9.2500000000, 0]) {
					cylinder(h = 2, r = 5);
				}
				translate(v = [-9.2500000000, -9.2500000000, 0]) {
					cylinder(h = 2, r = 5);
				}
				translate(v = [9.2500000000, -9.2500000000, 0]) {
					cylinder(h = 2, r = 5);
				}
			}
		}
		translate(v = [19.7500000000, 7.5000000000, -7.5000000000]) {
			rotate(a = [0, 90, 0]) {
				cylinder(h = 5, r = 7.0000000000);
			}
		}
		translate(v = [19.7500000000, 0.5000000000, -7.5000000000]) {
			cube(size = [5, 7.0000000000, 7.5000000000]);
		}
		translate(v = [14.7500000000, -7.5000000000, 0.0000000000]) {
			cube(size = [15, 30, 1]);
		}
		translate(v = [-24.7500000000, 7.5000000000, -7.5000000000]) {
			rotate(a = [0, 90, 0]) {
				cylinder(h = 5, r = 7.0000000000);
			}
		}
		translate(v = [-24.7500000000, 0.5000000000, -7.5000000000]) {
			cube(size = [5, 7.0000000000, 7.5000000000]);
		}
		translate(v = [-29.7500000000, -7.5000000000, 0.0000000000]) {
			cube(size = [15, 30, 1]);
		}
		translate(v = [0, -60, 0.0000000000]) {
			cylinder(h = 1, r = 5.0000000000);
		}
	}
	union() {
		translate(v = [14.7500000000, 7.5000000000, -7.5000000000]) {
			rotate(a = [0, 90, 0]) {
				cylinder(h = 15, r = 1.8000000000);
			}
		}
		translate(v = [-29.7500000000, 7.5000000000, -7.5000000000]) {
			rotate(a = [0, 90, 0]) {
				cylinder(h = 15, r = 1.8000000000);
			}
		}
		translate(v = [0, -60, -100.0000000000]) {
			cylinder(h = 200, r = 1.8000000000);
		}
	}
}
